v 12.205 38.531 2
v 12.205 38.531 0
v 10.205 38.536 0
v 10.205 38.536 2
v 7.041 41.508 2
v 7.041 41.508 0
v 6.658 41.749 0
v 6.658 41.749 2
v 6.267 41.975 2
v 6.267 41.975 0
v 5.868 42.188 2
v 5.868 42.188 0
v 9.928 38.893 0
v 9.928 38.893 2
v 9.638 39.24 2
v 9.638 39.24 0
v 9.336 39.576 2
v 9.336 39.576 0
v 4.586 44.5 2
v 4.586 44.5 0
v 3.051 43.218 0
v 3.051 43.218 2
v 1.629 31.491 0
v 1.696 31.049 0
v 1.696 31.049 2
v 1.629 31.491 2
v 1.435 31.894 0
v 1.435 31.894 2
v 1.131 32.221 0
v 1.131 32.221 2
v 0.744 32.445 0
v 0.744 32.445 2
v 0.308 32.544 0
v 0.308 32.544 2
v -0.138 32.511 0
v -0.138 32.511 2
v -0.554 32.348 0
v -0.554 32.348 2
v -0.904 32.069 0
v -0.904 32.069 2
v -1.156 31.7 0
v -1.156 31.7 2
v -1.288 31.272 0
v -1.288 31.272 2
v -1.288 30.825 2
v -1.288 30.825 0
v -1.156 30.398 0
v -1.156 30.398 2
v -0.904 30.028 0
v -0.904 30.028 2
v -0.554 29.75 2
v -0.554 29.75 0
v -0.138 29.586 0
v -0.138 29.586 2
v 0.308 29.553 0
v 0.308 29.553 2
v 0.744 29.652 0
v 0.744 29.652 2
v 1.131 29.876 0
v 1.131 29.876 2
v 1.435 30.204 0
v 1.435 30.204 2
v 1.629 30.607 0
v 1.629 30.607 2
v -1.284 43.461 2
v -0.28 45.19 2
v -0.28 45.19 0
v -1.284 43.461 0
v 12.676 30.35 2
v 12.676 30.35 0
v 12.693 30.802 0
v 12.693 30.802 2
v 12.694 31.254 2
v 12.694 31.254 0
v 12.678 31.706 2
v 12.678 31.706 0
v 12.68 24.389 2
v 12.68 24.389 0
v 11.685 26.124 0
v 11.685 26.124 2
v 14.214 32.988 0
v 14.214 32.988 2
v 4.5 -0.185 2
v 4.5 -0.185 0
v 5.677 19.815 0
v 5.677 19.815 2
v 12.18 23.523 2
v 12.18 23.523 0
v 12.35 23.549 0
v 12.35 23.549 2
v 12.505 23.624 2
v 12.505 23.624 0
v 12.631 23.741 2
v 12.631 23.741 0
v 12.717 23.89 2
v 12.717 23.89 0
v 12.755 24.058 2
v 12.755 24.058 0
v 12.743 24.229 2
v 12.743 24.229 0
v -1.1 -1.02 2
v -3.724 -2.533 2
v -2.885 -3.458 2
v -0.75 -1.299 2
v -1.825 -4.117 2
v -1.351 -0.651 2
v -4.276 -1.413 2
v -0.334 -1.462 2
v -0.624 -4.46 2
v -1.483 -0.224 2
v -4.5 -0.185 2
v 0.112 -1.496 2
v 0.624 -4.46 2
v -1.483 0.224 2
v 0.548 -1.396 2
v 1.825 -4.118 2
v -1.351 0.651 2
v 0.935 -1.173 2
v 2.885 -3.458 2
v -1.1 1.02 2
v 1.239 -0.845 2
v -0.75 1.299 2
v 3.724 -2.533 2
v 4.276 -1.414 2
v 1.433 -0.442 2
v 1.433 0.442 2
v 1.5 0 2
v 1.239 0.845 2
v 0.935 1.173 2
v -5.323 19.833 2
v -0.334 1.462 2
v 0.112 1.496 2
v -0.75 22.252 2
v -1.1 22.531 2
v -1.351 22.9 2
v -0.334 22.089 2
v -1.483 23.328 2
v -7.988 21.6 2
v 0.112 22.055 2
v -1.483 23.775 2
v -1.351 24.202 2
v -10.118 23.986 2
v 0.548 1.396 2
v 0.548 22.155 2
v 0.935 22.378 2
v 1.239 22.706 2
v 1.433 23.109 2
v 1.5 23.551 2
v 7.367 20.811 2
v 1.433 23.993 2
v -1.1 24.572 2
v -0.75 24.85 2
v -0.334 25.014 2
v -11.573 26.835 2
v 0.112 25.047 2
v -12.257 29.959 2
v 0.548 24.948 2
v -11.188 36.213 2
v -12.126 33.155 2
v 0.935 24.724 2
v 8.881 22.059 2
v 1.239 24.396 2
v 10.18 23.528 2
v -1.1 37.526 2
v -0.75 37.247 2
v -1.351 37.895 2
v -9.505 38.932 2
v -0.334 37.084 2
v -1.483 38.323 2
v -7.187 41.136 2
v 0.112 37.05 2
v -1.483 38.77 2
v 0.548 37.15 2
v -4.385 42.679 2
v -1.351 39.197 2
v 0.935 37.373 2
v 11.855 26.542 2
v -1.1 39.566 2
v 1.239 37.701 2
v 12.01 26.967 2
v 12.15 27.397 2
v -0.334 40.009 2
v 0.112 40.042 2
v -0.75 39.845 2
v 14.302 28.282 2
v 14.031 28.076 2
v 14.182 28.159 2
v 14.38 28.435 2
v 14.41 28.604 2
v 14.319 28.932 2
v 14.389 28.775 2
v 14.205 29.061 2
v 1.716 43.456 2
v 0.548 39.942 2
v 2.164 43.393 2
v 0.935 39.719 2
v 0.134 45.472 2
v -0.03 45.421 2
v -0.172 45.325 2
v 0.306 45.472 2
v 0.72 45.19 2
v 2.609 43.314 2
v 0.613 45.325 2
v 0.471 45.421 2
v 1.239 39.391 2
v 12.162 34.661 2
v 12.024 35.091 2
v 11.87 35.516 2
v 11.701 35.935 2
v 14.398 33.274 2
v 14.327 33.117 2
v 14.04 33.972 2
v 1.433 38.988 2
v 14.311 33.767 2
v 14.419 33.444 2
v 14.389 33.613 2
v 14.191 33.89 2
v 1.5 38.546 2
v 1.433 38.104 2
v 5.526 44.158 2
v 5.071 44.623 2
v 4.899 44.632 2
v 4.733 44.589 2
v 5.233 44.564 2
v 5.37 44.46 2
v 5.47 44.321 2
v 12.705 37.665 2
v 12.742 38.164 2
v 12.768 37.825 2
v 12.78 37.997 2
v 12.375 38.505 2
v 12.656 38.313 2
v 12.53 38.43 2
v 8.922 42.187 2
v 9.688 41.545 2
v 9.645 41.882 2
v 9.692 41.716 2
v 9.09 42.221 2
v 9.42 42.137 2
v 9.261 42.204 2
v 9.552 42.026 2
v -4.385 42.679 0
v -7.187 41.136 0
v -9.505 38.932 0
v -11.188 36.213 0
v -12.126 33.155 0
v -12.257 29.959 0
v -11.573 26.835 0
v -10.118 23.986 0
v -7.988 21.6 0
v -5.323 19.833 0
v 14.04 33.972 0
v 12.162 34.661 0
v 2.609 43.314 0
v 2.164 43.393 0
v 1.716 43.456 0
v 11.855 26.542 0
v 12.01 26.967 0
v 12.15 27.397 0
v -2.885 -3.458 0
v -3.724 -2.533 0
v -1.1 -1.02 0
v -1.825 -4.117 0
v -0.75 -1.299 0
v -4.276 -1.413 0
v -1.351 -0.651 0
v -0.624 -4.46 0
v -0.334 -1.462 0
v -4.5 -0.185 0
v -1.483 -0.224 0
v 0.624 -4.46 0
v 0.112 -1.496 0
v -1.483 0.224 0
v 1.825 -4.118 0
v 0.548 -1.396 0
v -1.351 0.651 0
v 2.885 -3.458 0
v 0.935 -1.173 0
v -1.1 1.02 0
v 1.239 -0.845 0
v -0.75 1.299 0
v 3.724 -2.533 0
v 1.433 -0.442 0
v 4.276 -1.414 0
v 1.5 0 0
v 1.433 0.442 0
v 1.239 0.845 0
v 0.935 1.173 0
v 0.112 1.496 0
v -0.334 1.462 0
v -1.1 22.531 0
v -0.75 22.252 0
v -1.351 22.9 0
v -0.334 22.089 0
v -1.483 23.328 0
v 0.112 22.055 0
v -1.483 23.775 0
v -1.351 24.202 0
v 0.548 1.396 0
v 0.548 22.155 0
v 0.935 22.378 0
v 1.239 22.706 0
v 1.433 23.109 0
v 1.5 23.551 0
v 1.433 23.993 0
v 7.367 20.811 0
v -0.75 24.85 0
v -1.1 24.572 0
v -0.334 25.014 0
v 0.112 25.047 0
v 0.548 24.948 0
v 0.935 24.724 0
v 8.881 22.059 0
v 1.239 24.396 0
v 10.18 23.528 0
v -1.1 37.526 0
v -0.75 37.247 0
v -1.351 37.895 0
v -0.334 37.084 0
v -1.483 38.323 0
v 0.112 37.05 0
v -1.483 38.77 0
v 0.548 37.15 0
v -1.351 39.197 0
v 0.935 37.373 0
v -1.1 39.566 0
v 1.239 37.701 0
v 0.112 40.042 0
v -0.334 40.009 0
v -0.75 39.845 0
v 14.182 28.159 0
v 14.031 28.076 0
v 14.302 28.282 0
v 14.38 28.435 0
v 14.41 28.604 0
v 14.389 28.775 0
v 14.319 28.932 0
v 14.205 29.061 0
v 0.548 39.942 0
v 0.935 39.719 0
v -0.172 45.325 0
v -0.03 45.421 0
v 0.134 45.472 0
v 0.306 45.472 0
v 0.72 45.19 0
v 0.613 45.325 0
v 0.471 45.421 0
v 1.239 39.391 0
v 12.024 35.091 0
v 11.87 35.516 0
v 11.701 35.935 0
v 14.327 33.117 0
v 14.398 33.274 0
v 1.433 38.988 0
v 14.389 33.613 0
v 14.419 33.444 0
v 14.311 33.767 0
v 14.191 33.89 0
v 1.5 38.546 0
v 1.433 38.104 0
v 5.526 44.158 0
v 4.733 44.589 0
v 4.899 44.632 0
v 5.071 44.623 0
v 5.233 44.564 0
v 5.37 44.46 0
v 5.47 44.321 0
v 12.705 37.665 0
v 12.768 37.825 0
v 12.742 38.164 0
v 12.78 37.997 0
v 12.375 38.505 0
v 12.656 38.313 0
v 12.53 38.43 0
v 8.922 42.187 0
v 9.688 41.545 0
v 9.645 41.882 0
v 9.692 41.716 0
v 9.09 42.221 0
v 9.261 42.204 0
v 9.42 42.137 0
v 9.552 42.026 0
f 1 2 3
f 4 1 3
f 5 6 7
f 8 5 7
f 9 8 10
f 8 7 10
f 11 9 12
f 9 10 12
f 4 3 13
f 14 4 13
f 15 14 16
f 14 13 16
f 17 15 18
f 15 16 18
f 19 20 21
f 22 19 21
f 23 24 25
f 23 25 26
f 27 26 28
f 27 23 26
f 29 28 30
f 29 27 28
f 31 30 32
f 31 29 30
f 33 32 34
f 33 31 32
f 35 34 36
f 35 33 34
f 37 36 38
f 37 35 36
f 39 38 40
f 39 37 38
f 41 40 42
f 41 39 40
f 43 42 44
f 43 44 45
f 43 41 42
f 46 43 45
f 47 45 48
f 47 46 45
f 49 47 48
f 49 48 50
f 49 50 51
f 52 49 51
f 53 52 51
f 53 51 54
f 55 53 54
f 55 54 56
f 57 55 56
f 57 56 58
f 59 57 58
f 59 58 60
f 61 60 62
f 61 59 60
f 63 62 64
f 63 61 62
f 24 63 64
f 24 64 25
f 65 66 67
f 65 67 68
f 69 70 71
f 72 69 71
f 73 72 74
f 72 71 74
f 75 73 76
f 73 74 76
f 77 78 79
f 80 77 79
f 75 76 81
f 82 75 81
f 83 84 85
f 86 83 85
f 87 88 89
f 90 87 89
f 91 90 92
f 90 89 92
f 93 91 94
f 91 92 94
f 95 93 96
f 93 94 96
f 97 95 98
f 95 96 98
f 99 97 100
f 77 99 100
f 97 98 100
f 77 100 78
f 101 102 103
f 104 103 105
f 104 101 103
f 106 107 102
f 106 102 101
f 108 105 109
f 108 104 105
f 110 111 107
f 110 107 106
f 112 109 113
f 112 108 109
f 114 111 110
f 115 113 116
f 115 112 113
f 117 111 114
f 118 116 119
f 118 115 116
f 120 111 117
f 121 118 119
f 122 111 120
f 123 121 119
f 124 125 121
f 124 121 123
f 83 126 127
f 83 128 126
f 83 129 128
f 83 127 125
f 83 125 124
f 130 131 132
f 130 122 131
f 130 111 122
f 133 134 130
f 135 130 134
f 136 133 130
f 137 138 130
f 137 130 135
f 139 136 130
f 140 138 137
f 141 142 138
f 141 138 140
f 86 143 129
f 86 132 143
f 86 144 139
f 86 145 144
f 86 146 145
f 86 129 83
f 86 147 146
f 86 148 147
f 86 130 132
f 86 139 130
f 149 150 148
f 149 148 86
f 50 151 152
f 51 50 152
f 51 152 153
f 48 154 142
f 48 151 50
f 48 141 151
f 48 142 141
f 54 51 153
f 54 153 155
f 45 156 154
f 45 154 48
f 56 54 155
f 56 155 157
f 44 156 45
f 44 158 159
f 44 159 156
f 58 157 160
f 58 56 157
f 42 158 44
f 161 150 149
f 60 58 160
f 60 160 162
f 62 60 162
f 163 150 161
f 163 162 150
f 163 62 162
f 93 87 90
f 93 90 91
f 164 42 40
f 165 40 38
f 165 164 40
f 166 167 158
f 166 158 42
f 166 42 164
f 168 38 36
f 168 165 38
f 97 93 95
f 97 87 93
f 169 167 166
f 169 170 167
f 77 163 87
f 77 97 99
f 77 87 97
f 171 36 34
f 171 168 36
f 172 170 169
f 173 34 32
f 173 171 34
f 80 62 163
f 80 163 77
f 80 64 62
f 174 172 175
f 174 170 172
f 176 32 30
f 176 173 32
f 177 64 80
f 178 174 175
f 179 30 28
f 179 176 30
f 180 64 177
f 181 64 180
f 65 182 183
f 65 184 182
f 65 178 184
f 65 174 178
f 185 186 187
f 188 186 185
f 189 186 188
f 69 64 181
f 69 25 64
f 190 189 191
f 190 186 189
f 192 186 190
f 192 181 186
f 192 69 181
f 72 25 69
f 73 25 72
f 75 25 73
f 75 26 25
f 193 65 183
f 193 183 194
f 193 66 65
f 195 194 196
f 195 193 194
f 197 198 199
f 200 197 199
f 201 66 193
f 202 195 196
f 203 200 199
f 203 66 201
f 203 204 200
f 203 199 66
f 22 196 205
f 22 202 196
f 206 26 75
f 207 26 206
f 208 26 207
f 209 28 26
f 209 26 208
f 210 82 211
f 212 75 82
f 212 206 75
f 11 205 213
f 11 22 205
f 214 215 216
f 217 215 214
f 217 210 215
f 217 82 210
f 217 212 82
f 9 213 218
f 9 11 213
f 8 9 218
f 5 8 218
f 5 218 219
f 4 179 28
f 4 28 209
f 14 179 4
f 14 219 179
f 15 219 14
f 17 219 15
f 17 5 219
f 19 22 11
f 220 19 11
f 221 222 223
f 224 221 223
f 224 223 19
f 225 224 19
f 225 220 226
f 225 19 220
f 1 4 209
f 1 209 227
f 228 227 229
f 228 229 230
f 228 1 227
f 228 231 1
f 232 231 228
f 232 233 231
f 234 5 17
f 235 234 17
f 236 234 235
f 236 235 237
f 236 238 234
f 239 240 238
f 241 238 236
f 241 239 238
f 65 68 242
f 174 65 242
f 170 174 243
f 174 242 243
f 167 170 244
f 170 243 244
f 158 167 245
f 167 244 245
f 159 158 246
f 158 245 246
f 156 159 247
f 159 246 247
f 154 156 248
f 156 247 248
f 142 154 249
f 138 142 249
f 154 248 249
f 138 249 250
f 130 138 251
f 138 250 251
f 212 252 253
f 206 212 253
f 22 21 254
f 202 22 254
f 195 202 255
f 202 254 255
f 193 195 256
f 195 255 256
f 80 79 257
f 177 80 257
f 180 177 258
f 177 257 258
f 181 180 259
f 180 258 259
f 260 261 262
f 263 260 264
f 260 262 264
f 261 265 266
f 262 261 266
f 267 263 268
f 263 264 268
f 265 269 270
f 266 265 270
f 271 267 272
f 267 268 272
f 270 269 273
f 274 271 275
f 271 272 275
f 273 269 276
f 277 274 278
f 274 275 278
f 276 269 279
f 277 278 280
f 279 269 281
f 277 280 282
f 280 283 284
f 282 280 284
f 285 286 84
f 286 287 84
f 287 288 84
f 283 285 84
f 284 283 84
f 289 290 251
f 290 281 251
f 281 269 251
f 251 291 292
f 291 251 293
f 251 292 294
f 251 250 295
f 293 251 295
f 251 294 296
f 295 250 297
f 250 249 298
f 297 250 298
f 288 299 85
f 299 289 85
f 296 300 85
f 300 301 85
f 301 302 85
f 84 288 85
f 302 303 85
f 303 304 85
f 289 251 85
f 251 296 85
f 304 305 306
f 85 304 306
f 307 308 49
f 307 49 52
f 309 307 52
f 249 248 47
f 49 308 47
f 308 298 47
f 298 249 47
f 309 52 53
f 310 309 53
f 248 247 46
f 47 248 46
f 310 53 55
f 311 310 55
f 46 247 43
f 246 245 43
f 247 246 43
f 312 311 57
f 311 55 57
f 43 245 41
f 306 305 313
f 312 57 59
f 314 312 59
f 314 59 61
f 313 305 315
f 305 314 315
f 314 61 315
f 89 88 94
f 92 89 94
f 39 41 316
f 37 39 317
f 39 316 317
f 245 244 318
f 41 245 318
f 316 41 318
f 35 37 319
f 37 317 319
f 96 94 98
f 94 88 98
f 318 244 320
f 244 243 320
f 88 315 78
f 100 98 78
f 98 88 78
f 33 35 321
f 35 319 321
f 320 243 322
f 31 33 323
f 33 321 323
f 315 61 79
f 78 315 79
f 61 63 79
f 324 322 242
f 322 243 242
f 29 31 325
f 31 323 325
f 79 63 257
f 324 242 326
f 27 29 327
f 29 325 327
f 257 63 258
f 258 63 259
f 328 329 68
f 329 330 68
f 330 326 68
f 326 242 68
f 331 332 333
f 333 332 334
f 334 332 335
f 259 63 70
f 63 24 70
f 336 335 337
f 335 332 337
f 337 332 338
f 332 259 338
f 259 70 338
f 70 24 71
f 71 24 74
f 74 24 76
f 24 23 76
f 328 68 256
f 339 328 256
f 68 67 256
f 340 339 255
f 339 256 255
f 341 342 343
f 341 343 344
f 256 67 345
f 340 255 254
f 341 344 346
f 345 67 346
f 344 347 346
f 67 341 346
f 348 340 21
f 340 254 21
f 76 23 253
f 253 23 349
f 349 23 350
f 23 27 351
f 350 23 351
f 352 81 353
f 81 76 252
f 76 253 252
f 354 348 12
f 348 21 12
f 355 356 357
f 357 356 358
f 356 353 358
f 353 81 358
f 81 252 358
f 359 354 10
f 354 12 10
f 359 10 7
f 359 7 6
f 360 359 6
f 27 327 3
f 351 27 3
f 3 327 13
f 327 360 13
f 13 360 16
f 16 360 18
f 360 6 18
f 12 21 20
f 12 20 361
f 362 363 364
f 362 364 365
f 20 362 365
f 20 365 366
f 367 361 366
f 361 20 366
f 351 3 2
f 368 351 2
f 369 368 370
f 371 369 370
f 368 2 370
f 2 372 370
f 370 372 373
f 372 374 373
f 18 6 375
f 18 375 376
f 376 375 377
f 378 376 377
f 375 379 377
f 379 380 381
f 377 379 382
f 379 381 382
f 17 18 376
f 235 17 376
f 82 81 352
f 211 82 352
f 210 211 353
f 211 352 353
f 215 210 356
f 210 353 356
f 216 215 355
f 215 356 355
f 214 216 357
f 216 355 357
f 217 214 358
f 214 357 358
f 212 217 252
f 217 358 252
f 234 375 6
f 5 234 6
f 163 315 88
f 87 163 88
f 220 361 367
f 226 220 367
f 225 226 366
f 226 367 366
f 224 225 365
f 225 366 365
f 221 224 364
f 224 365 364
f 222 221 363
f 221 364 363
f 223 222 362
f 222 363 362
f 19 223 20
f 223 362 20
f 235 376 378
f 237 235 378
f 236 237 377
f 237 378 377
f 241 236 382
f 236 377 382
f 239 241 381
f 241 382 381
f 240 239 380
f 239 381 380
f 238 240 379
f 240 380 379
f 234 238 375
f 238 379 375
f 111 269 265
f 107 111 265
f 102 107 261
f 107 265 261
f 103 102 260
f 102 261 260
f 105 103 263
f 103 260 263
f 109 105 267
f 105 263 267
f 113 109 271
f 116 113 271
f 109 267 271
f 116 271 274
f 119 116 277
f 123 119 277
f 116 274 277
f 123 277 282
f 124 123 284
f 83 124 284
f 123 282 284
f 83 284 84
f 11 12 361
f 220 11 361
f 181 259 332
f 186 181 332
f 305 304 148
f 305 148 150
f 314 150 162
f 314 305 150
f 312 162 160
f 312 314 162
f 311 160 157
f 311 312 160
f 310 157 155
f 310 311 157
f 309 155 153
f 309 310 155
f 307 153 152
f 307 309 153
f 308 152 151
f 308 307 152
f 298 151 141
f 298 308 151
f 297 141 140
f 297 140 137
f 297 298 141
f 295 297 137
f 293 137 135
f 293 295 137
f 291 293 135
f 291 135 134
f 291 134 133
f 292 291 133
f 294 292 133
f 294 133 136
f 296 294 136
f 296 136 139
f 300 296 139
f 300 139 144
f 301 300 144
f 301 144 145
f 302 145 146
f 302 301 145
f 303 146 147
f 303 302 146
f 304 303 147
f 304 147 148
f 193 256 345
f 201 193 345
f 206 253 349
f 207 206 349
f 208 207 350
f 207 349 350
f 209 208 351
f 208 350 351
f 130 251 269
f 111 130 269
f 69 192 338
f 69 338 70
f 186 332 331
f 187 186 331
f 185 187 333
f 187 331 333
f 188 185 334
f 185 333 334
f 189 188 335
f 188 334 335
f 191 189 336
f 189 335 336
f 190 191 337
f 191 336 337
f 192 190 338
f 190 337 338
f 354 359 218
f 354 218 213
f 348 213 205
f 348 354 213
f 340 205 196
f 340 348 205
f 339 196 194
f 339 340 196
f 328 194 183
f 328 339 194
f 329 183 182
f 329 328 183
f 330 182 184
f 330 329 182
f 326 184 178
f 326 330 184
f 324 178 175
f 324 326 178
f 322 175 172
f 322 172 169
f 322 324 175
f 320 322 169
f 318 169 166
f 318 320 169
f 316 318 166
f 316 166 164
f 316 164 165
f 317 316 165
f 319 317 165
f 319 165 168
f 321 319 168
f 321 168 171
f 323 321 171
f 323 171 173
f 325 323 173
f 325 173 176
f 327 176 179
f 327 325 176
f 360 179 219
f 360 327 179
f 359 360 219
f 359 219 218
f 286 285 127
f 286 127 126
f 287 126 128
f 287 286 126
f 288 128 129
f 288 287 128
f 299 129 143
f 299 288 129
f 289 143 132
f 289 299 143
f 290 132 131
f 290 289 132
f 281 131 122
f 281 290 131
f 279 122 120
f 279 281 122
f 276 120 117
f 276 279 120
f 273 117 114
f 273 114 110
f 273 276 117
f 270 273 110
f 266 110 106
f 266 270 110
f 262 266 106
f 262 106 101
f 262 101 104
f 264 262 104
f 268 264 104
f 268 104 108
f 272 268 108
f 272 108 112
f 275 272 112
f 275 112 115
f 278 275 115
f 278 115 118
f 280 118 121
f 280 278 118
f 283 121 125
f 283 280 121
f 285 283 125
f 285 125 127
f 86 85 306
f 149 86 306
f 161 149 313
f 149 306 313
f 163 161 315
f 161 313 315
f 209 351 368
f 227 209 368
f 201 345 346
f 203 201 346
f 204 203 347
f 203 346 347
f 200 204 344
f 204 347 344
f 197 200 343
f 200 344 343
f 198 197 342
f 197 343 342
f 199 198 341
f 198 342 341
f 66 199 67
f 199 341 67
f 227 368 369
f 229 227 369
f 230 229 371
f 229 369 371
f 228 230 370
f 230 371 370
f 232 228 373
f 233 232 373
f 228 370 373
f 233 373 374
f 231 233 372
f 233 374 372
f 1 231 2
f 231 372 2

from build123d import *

# Parameters (mm, degrees)
SKETCH1_R           = 1.5
BOSS_EXTRUDE1_DEPTH = 2


with BuildPart() as part:
    # Sketch1 → Boss-Extrude1 (new body)
    with BuildSketch(Plane.XY):
        with BuildLine():
            Line((-5.322767432, 19.832757644), (-4.500006862, -0.184957582))
            ThreePointArc((-4.500006862, -0.184957582), (-0.000167017, -4.503806283), (4.499993132, -0.185291335))
            Line((4.499993132, -0.185291335), (5.67721776, 19.814708665))
            ThreePointArc((5.67721776, 19.814708665), (8.148561948, 21.404983206), (10.180318916, 23.528301089))
            Line((10.180318916, 23.528301089), (12.180312779, 23.523346368))
            ThreePointArc((12.180312779, 23.523346368), (12.679597114, 23.812434692), (12.680312779, 24.389371772))
            Line((12.680312779, 24.389371772), (11.684612917, 26.123898158))
            ThreePointArc((11.684612917, 26.123898158), (11.934719035, 26.754030681), (12.150293859, 27.396796239))
            Line((12.150293859, 27.396796239), (14.031367948, 28.076178512))
            ThreePointArc((14.031367948, 28.076178512), (14.401667723, 28.518597977), (14.205016126, 29.060986265))
            Line((14.205016126, 29.060986265), (12.67612135, 30.350358501))
            ThreePointArc((12.67612135, 30.350358501), (12.695626208, 31.028030714), (12.678361511, 31.705763698))
            Line((12.678361511, 31.705763698), (14.213630529, 32.987539436))
            ThreePointArc((14.213630529, 32.987539436), (14.410282126, 33.529927724), (14.039982351, 33.972347189))
            Line((14.039982351, 33.972347189), (12.162299935, 34.661047954))
            ThreePointArc((12.162299935, 34.661047954), (11.948850959, 35.304522586), (11.700829119, 35.935478396))
            Line((11.700829119, 35.935478396), (12.705116964, 37.665046528))
            ThreePointArc((12.705116964, 37.665046528), (12.704401299, 38.241983607), (12.205116964, 38.531071932))
            Line((12.205116964, 38.531071932), (10.205123119, 38.536033749))
            ThreePointArc((10.205123119, 38.536033749), (9.784465406, 39.067698263), (9.335601516, 39.575774317))
            Line((9.335601516, 39.575774317), (9.687776253, 41.5445234))
            ThreePointArc((9.687776253, 41.5445234), (9.489779645, 42.086422145), (8.92173181, 42.18731101))
            Line((8.92173181, 42.18731101), (7.040655311, 41.507935412))
            ThreePointArc((7.040655311, 41.507935412), (6.463526388, 41.863663221), (5.867960059, 42.187578047))
            Line((5.867960059, 42.187578047), (5.525544216, 44.158047887))
            ThreePointArc((5.525544216, 44.158047887), (5.154147979, 44.59954731), (4.585851596, 44.500068031))
            Line((4.585851596, 44.500068031), (3.050578029, 43.21829774))
            ThreePointArc((3.050578029, 43.21829774), (2.386588163, 43.355182821), (1.716153483, 43.455867511))
            Line((1.716153483, 43.455867511), (0.720447466, 45.190390364))
            ThreePointArc((0.720447466, 45.190390364), (0.220447466, 45.47823912), (-0.279552534, 45.190390364))
            Line((-0.279552534, 45.190390364), (-1.283846517, 43.460825796))
            ThreePointArc((-1.283846517, 43.460825796), (-12.125641313, 33.154858755), (-5.322767432, 19.832757644))
        make_face()
        with Locations((0.19564328, 31.048690205)):
            Circle(SKETCH1_R, mode=Mode.SUBTRACT)
        with Locations((0, 38.546138017)):
            Circle(SKETCH1_R, mode=Mode.SUBTRACT)
        with Locations((0, 23.551242392)):
            Circle(SKETCH1_R, mode=Mode.SUBTRACT)
        Circle(SKETCH1_R, mode=Mode.SUBTRACT)
    extrude(amount=BOSS_EXTRUDE1_DEPTH)


solid = part.part
